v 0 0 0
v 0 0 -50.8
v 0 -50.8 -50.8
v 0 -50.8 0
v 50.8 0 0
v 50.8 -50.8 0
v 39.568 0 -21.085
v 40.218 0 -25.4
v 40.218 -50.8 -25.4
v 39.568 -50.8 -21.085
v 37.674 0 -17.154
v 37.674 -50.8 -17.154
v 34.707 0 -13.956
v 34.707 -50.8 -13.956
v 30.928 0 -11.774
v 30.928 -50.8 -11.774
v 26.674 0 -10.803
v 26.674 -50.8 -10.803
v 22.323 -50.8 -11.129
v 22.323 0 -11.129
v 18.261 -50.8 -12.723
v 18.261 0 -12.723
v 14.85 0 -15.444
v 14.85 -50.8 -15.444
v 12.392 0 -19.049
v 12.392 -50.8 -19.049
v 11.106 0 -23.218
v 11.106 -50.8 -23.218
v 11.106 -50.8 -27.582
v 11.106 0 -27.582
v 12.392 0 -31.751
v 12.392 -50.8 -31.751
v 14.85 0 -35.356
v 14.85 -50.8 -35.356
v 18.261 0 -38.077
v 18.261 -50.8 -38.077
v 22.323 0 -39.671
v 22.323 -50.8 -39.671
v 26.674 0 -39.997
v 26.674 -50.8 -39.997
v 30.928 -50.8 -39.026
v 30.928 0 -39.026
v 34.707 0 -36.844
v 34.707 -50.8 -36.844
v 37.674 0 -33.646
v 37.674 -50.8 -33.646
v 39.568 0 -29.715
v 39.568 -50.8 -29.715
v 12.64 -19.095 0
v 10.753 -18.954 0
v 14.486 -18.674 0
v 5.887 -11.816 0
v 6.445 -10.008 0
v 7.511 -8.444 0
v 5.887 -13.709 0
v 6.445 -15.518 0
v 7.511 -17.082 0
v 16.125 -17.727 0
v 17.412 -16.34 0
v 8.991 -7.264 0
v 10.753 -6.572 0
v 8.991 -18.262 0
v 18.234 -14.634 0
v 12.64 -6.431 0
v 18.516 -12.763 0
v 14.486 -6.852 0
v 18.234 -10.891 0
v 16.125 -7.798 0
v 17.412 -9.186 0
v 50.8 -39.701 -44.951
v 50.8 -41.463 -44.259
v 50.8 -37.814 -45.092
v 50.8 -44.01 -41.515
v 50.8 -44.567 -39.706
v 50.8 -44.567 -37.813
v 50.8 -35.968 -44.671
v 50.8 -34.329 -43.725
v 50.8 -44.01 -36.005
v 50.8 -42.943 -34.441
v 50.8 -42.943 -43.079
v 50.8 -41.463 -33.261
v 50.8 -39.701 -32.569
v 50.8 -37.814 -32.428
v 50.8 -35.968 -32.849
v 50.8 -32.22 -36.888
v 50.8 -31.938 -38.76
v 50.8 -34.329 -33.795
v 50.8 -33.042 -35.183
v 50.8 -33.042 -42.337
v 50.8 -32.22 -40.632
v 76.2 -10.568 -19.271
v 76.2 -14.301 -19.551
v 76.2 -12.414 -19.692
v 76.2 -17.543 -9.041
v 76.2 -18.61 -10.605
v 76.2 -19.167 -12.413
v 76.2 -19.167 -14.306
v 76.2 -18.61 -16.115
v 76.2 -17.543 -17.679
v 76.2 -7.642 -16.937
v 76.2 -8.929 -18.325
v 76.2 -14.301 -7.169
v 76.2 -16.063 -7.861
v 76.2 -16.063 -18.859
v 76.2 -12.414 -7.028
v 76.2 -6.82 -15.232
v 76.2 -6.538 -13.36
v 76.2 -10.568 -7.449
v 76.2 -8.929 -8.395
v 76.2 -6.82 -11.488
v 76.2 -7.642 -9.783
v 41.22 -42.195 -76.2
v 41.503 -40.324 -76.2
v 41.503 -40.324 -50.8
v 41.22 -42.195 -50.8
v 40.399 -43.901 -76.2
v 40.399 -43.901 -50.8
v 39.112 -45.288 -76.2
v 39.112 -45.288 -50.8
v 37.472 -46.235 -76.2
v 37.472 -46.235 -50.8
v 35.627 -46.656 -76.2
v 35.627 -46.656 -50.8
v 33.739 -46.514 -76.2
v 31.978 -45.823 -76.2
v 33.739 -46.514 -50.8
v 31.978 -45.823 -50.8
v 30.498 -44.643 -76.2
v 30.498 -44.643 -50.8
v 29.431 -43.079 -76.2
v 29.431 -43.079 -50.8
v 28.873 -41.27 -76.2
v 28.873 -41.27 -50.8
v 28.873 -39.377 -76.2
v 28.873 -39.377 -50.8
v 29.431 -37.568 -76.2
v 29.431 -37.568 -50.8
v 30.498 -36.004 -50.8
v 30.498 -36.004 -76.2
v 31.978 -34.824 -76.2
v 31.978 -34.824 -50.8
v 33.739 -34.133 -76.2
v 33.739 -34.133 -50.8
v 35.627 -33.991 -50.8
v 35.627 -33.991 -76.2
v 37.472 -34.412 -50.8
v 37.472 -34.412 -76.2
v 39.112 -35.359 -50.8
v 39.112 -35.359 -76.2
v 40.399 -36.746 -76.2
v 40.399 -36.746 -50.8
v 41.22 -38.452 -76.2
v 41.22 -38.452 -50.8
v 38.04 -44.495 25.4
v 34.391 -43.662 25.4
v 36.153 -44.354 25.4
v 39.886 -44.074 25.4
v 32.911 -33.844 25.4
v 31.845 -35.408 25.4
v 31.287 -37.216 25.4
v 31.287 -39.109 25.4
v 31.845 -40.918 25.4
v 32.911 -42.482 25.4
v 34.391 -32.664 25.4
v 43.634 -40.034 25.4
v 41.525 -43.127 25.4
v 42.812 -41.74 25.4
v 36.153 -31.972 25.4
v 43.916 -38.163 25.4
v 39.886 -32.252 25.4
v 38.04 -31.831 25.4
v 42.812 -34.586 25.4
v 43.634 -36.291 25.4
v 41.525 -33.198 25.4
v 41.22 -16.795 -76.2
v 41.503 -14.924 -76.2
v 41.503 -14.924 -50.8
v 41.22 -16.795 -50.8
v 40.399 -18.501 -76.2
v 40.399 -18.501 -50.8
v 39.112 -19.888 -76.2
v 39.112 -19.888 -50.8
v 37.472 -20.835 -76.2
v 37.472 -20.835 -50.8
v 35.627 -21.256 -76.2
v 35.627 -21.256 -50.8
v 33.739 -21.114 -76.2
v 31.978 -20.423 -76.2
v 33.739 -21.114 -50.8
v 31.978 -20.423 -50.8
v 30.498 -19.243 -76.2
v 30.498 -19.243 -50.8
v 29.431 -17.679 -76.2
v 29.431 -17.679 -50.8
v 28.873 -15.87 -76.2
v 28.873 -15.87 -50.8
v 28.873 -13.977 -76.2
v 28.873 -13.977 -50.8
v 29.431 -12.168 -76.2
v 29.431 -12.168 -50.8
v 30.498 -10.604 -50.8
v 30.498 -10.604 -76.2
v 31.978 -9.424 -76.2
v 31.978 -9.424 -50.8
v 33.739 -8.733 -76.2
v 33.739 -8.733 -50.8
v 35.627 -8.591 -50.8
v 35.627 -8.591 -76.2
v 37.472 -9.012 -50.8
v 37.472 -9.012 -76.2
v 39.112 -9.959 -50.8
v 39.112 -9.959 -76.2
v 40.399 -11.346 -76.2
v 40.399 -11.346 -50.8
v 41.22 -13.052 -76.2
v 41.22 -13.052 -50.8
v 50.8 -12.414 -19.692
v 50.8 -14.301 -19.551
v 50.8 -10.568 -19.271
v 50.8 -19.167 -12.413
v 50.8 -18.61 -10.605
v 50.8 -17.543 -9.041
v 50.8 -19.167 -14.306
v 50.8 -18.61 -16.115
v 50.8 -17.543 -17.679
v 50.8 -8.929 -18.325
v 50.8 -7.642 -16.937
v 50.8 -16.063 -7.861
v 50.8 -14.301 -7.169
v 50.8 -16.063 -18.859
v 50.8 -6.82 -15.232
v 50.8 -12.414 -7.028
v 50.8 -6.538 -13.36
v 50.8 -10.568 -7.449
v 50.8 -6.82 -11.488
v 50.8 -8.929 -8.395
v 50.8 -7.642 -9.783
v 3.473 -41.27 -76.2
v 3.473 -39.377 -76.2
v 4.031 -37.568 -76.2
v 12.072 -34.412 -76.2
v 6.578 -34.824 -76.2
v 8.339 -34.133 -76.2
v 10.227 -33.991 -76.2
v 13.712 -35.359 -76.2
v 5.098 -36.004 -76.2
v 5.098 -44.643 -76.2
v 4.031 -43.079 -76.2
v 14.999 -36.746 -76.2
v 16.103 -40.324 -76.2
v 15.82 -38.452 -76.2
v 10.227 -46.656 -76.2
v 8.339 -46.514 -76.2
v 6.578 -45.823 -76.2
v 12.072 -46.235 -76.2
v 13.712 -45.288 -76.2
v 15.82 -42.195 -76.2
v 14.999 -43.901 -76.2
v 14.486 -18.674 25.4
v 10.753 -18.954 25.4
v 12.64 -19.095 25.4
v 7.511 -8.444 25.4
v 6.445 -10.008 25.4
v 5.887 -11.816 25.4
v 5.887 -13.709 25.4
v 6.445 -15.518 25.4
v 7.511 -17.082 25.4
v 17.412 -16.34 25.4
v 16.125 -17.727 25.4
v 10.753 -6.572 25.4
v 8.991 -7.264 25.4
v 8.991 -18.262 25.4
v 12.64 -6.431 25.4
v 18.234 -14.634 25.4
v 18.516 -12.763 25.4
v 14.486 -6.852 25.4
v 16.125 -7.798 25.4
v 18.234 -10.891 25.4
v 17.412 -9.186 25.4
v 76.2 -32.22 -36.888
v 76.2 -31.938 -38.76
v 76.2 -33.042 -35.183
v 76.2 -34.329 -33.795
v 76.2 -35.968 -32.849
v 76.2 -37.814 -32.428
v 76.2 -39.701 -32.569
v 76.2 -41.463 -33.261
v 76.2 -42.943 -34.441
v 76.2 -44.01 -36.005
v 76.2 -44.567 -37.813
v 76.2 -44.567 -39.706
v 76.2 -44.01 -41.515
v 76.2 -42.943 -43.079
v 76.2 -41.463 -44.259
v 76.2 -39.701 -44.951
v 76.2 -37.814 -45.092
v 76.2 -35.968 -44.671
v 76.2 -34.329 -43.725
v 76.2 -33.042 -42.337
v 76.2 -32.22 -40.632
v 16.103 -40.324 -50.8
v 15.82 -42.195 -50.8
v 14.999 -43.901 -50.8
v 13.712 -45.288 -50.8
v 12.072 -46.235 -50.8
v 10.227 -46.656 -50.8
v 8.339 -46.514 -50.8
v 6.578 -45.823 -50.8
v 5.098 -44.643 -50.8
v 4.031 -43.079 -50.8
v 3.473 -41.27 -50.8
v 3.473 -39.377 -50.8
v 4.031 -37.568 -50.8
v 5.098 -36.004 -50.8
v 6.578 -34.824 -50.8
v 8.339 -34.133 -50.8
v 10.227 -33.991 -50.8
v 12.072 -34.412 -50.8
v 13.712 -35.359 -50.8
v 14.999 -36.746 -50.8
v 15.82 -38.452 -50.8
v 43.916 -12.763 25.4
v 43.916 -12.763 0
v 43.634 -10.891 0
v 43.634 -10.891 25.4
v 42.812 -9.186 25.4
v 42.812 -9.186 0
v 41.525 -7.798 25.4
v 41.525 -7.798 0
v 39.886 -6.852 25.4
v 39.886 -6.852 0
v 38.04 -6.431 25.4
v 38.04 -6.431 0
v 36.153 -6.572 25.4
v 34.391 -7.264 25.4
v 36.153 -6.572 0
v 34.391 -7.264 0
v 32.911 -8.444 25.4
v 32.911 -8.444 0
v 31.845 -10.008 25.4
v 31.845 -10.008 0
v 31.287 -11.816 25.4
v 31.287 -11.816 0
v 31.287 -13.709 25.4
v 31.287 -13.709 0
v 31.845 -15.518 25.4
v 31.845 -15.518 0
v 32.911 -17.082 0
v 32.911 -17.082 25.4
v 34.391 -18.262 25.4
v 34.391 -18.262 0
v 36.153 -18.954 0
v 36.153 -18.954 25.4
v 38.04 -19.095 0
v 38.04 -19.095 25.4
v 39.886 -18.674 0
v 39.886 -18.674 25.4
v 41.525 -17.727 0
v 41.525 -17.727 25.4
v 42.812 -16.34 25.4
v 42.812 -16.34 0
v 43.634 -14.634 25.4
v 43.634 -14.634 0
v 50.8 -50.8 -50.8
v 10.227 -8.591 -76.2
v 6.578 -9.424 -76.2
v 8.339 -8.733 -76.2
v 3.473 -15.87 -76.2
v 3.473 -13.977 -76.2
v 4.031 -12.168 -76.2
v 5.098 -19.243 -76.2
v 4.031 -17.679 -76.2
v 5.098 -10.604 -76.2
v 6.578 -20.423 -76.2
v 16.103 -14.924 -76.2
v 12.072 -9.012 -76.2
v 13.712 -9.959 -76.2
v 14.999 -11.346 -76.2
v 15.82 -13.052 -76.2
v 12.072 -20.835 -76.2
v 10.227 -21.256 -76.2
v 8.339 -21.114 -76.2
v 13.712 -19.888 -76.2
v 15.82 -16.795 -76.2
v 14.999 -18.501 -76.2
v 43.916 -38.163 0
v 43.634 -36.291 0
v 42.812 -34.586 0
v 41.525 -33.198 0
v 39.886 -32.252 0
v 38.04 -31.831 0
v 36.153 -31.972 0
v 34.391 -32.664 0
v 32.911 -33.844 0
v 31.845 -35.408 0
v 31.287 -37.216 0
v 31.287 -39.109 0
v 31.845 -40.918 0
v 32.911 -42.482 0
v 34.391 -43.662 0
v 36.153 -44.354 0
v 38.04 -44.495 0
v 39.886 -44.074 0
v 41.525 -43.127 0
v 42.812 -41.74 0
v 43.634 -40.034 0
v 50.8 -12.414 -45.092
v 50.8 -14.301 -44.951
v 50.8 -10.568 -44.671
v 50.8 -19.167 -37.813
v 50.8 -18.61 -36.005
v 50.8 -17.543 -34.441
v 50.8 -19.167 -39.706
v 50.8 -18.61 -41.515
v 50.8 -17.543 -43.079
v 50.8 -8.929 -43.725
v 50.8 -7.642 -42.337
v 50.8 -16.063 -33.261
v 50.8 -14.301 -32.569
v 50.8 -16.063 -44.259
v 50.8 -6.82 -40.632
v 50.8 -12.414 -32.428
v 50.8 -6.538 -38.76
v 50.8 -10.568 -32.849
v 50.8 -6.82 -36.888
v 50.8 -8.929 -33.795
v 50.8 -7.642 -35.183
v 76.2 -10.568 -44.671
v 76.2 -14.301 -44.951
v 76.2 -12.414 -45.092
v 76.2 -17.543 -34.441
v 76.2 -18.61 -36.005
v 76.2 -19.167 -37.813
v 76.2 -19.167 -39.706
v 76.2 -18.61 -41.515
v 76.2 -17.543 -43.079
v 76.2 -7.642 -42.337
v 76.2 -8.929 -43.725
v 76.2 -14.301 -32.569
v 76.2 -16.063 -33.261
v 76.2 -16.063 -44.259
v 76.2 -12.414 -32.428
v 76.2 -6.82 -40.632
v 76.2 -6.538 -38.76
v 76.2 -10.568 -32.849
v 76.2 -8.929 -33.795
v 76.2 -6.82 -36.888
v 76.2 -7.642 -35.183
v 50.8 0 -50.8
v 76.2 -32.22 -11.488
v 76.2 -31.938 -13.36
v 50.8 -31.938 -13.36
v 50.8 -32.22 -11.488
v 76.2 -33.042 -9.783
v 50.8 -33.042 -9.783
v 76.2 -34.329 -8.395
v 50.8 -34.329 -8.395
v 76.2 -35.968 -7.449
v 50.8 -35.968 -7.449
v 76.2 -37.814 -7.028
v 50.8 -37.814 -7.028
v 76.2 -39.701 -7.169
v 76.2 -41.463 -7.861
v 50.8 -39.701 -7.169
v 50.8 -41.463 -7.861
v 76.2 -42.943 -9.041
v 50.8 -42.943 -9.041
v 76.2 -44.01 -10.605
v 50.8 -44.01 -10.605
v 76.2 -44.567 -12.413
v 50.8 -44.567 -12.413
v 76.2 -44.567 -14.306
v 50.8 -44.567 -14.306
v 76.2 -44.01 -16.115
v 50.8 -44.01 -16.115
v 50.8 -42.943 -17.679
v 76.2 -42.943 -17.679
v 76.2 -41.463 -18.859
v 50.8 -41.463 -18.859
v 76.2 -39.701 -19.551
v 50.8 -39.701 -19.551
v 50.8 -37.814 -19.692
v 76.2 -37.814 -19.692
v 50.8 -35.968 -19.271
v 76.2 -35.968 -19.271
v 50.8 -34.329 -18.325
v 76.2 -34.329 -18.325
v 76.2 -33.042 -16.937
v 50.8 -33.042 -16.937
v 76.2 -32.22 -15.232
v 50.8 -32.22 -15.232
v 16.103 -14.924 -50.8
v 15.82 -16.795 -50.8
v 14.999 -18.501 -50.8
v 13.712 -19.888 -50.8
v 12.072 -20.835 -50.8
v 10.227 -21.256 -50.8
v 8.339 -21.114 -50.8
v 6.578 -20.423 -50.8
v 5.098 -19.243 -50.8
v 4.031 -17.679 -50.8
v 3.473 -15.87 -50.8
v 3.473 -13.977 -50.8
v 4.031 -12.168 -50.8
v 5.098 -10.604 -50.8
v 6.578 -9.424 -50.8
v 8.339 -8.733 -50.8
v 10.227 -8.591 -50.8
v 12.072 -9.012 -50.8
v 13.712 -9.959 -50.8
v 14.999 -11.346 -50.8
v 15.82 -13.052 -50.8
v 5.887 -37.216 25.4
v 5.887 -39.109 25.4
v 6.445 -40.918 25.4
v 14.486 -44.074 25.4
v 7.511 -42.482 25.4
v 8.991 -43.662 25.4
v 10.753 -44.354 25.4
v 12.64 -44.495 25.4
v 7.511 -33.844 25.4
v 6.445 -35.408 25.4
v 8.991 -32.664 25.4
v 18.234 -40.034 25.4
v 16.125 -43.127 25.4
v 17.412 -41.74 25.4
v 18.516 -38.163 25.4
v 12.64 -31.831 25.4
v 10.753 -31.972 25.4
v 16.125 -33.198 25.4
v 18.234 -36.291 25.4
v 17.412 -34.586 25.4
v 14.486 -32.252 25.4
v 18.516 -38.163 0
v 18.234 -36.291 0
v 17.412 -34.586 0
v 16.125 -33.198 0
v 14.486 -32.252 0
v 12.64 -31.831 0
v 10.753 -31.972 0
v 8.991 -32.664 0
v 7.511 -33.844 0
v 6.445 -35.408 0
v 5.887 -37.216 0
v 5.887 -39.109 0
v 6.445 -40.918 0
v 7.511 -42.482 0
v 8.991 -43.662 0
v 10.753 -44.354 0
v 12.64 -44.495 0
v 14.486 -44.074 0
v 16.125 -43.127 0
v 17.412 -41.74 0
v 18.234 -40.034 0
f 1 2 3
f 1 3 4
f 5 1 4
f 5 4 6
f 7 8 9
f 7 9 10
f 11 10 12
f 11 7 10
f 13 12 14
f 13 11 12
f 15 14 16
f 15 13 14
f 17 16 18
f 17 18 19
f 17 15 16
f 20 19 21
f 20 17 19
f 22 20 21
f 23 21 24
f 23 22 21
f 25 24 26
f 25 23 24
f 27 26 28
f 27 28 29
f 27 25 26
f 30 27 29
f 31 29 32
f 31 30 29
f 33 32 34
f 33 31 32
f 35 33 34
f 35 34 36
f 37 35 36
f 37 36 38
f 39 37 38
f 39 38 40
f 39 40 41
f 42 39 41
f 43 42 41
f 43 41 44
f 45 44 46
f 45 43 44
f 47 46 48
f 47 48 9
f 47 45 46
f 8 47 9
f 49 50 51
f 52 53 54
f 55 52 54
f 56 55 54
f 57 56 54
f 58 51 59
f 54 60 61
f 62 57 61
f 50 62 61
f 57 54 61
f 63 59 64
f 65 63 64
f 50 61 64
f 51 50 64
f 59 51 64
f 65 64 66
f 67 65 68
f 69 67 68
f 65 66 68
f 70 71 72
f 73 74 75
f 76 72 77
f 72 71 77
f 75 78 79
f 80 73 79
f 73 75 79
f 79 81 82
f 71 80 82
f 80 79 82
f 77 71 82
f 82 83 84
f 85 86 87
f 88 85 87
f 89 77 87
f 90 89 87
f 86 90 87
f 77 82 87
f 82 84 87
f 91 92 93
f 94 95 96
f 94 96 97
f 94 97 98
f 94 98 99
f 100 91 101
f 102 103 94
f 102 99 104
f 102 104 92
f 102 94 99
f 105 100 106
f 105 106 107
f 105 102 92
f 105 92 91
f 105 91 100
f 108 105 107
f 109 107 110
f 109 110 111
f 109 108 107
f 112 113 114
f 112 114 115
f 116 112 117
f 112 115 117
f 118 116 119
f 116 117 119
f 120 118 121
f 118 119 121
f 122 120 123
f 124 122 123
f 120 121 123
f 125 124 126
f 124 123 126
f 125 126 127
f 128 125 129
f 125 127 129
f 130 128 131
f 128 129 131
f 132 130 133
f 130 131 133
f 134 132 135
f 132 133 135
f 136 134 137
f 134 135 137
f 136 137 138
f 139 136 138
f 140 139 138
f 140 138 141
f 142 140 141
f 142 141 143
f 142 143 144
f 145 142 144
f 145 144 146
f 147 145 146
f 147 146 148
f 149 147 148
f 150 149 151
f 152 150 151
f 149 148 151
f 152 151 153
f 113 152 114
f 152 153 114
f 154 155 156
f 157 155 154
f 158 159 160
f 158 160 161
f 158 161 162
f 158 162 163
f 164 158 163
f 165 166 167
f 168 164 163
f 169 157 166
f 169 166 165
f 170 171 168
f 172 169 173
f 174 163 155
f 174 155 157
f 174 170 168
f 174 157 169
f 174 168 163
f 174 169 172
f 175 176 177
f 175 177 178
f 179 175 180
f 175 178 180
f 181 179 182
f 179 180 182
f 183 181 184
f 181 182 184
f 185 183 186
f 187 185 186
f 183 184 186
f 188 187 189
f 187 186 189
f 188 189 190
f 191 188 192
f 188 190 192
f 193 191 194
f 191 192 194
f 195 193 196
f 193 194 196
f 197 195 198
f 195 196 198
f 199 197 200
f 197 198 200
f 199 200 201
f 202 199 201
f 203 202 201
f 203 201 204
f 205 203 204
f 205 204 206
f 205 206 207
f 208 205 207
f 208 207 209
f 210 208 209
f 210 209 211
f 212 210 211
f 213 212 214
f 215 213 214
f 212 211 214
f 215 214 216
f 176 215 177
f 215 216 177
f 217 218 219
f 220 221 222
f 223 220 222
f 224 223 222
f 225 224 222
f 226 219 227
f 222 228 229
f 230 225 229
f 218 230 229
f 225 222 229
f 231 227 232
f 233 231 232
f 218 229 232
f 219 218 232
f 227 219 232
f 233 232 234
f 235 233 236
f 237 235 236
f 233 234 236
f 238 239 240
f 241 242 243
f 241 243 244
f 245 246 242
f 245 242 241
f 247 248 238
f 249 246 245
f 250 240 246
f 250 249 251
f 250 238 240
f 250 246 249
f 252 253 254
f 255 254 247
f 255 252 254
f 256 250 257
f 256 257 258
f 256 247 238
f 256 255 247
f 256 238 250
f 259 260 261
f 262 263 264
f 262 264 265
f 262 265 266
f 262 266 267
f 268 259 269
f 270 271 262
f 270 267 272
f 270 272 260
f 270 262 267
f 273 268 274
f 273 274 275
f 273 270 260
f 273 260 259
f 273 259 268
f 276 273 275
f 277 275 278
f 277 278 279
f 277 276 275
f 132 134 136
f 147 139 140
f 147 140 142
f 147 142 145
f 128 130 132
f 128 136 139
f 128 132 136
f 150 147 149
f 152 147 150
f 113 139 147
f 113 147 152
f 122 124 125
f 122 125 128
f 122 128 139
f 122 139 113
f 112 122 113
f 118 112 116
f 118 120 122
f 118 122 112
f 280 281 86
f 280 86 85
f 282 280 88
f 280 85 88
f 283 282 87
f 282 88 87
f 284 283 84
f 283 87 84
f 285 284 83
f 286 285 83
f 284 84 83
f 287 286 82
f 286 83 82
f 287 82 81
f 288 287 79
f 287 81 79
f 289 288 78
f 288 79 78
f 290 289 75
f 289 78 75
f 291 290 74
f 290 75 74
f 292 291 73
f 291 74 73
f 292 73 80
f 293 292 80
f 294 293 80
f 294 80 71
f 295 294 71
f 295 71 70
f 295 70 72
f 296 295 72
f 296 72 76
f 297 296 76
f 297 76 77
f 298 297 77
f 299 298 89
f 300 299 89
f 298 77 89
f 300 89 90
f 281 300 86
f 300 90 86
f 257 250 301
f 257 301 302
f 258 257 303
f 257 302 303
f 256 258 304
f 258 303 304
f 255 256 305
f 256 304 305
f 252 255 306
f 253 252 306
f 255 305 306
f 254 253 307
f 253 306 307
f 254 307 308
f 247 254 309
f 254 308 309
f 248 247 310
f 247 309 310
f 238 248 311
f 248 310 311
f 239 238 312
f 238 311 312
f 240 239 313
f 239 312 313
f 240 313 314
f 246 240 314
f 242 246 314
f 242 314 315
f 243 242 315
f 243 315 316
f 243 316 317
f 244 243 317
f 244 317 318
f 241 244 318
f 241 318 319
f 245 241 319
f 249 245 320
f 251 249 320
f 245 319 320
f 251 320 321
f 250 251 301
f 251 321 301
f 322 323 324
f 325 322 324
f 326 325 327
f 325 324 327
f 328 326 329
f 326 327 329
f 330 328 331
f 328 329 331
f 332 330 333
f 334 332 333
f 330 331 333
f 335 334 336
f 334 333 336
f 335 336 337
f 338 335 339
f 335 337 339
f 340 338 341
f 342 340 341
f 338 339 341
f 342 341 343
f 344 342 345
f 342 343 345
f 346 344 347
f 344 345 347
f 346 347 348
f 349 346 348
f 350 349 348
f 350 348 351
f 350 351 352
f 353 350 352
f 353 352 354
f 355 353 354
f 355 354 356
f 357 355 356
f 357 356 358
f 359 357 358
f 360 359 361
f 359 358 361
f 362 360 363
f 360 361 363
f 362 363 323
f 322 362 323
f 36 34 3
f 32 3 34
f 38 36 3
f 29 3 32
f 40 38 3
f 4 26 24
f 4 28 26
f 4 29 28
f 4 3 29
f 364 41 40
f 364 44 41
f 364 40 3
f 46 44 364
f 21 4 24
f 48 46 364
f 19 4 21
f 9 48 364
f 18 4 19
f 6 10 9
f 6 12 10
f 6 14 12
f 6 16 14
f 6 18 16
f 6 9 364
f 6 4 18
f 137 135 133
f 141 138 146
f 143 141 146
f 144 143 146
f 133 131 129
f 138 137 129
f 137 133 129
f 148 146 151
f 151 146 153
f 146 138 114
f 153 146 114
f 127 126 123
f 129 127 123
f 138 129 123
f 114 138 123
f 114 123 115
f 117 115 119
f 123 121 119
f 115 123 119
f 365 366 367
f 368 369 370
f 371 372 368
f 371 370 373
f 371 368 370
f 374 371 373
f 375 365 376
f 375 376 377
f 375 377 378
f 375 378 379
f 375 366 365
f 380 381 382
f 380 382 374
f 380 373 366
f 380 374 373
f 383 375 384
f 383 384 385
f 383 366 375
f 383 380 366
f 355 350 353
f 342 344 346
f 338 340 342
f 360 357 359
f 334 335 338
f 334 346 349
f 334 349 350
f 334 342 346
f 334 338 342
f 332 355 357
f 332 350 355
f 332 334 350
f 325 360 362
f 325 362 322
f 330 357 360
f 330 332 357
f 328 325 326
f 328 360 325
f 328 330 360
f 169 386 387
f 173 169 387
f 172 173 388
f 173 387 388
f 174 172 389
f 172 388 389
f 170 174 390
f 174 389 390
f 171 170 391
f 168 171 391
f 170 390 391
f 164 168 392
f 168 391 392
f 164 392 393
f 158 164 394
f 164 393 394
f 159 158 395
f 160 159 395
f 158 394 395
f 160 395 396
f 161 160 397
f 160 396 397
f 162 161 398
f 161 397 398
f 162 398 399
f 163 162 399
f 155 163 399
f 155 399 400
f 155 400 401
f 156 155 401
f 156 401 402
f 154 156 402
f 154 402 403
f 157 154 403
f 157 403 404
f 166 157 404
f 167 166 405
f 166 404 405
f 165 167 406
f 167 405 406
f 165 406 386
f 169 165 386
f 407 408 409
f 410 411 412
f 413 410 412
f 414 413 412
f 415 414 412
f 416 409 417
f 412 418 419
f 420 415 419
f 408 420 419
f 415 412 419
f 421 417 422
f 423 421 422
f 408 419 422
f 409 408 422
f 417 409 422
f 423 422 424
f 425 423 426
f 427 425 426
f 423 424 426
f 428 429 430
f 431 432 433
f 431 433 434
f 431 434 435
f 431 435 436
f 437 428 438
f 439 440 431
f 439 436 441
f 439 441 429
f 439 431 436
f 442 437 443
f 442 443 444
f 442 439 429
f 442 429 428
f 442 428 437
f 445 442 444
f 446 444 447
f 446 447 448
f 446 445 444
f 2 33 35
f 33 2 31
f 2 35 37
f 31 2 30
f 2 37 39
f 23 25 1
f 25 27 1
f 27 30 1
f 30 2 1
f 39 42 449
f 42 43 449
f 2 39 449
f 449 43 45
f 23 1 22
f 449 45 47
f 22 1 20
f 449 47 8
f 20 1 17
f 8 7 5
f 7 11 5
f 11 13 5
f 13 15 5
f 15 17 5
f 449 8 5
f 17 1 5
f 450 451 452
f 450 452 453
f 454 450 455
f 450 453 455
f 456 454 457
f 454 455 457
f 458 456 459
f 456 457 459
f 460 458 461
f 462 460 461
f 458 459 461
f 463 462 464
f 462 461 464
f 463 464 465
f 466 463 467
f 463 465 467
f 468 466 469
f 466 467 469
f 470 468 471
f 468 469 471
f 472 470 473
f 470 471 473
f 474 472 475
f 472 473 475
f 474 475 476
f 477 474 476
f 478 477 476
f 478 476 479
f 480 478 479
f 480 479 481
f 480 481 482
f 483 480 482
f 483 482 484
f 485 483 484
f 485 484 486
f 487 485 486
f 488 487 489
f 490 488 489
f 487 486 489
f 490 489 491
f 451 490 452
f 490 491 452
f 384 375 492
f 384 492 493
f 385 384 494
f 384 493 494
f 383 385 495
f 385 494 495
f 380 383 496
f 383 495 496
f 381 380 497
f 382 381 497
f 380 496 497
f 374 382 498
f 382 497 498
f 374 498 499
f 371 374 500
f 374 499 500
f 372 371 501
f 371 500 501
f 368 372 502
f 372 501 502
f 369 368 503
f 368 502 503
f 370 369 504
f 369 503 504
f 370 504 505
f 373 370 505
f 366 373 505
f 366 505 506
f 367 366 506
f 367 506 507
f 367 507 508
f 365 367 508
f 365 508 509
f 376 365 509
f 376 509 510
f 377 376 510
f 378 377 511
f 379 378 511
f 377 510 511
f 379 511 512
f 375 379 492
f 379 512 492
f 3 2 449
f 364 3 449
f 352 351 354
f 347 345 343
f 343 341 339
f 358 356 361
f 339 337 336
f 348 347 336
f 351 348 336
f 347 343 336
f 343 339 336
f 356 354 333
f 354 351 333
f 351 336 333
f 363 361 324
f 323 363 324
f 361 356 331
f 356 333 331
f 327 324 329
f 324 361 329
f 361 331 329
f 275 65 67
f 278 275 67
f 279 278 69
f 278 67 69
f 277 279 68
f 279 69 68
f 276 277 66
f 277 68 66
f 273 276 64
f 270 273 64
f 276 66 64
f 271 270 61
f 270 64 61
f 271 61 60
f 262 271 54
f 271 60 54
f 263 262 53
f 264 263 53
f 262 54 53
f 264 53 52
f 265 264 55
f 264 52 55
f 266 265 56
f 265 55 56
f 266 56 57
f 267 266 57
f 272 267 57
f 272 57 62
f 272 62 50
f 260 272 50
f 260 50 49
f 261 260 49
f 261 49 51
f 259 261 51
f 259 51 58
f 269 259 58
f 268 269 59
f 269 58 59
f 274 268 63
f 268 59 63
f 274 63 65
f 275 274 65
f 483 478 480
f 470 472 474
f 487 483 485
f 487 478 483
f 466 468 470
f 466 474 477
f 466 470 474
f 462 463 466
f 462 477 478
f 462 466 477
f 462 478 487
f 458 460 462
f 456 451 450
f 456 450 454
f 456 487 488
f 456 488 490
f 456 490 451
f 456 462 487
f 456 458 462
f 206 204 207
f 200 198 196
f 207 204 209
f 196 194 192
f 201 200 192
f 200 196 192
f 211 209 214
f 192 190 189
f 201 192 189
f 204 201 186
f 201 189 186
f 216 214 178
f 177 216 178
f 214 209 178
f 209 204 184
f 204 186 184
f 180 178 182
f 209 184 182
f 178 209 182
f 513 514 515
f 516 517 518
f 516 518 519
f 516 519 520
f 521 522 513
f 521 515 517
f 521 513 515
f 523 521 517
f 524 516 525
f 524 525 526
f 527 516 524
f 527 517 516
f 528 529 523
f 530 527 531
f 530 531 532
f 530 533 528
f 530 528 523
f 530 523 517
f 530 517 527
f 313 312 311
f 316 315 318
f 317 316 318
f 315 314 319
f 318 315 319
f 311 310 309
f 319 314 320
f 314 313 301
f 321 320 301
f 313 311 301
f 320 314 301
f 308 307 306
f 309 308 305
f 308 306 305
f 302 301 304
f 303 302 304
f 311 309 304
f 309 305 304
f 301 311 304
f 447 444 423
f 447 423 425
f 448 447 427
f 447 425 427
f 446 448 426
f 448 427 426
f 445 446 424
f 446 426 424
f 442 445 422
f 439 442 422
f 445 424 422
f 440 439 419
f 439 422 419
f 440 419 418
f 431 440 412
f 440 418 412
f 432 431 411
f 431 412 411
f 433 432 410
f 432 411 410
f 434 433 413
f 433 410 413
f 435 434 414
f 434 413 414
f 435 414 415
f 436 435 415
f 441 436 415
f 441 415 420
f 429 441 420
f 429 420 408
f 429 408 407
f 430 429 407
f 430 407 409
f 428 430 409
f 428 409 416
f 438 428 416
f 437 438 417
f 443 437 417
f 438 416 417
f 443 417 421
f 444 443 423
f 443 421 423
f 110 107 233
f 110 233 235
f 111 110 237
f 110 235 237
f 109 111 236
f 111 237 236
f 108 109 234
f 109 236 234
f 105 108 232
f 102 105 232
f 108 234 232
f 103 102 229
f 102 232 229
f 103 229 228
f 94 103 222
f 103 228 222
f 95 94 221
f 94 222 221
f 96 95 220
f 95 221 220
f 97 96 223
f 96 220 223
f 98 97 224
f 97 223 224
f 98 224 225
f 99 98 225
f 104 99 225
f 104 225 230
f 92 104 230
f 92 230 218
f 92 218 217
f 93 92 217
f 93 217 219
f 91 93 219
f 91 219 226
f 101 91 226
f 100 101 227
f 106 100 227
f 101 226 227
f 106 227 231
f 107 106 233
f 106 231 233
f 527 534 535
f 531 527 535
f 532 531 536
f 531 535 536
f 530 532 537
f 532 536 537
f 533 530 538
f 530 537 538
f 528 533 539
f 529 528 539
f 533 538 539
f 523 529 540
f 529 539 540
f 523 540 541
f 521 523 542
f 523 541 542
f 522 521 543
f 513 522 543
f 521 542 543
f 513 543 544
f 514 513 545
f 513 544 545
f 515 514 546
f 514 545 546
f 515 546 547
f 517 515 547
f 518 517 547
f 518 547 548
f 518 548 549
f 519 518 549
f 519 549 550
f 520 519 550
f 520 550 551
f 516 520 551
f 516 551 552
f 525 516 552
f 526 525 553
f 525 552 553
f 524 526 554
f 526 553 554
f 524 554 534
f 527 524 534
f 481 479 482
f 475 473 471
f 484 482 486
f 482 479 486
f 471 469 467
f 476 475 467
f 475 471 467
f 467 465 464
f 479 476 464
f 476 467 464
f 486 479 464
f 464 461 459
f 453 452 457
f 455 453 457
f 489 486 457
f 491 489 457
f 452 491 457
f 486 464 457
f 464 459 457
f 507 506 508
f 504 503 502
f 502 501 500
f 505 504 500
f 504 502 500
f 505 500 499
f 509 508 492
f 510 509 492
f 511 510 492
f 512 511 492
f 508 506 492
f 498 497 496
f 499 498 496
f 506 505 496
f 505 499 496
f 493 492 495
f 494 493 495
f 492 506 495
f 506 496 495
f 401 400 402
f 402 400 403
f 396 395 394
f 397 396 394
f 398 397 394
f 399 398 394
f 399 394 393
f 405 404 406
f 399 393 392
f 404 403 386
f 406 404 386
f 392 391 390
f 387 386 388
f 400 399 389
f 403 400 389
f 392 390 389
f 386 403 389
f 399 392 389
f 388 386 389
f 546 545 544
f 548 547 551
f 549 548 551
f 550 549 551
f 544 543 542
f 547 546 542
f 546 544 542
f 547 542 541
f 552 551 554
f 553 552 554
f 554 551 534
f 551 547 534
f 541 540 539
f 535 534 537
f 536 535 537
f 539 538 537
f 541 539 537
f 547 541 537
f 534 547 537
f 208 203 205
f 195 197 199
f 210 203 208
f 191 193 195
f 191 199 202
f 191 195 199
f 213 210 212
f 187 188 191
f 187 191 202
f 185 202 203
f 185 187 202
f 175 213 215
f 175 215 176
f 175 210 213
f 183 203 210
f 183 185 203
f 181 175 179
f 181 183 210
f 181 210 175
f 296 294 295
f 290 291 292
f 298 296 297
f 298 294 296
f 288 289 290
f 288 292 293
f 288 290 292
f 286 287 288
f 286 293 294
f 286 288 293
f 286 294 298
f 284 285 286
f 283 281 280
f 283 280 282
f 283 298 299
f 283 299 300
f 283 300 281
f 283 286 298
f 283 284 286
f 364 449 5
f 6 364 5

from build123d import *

# Parameters (mm, degrees)
F0_W     = 50.8
F0_H     = 50.8
F0_R     = 14.6377609255
F1_DEPTH = 50.8
F2_R     = 6.35
F3_DEPTH = 25.4
F4_R     = 6.35
F5_DEPTH = 25.4
F6_R     = 6.35
F7_DEPTH = 25.4


# Not quite as in the source:
# - the program builds the solid bodies; features that only make, move or delete a surface that nothing else refers to are left out


with BuildPart() as f1:
    # F0 (on Front) → F1 (new body)
    with BuildSketch(Plane.XZ):
        with Locations((25.4, -25.4)):
            Rectangle(F0_W, F0_H)
        with Locations((25.5802143365, -25.4)):
            Circle(F0_R, mode=Mode.SUBTRACT)
    extrude(amount=F1_DEPTH)


with BuildPart() as f3:
    # F2 (on Top) → F3 (new body)
    with BuildSketch(Plane.XY):
        with Locations((37.5657010168, -12.7627896145)):
            Circle(F2_R)
    extrude(amount=F3_DEPTH)


with BuildPart() as f3b:
    # F2 (on Top) → F3, piece 2 (new body)
    with BuildSketch(Plane.XY):
        with Locations((37.5657010168, -38.1627896145)):
            Circle(F2_R)
    extrude(amount=F3_DEPTH)


with BuildPart() as f3c:
    # F2 (on Top) → F3, piece 3 (new body)
    with BuildSketch(Plane.XY):
        with Locations((12.1657010168, -38.1627896145)):
            Circle(F2_R)
    extrude(amount=F3_DEPTH)


with BuildPart() as f3d:
    # F2 (on Top) → F3, piece 4 (new body)
    with BuildSketch(Plane.XY):
        with Locations((12.1657010168, -12.7627896145)):
            Circle(F2_R)
    extrude(amount=F3_DEPTH)


with BuildPart() as f5:
    # F4 (on face) → F5 (new body)
    with BuildSketch(Plane.YZ.offset(50.8)):
        with Locations((-12.8883697748, -38.7598782122)):
            Circle(F4_R)
    extrude(amount=F5_DEPTH)


with BuildPart() as f5b:
    # F4 (on face) → F5, piece 2 (new body)
    with BuildSketch(Plane.YZ.offset(50.8)):
        with Locations((-12.8883697748, -13.3598782122)):
            Circle(F4_R)
    extrude(amount=F5_DEPTH)


with BuildPart() as f5c:
    # F4 (on face) → F5, piece 3 (new body)
    with BuildSketch(Plane.YZ.offset(50.8)):
        with Locations((-38.2883697748, -13.3598782122)):
            Circle(F4_R)
    extrude(amount=F5_DEPTH)


with BuildPart() as f5d:
    # F4 (on face) → F5, piece 4 (new body)
    with BuildSketch(Plane.YZ.offset(50.8)):
        with Locations((-38.2883697748, -38.7598782122)):
            Circle(F4_R)
    extrude(amount=F5_DEPTH)


with BuildPart() as f7:
    # F6 (on face) → F7 (new body)
    with BuildSketch(Plane(origin=(0, 0, -50.8), x_dir=(1, 0, 0), z_dir=(0, 0, -1))):
        with Locations((9.7525073215, 40.323510766)):
            Circle(F6_R)
    extrude(amount=F7_DEPTH)


with BuildPart() as f7b:
    # F6 (on face) → F7, piece 2 (new body)
    with BuildSketch(Plane(origin=(0, 0, -50.8), x_dir=(1, 0, 0), z_dir=(0, 0, -1))):
        with Locations((35.1525073215, 14.923510766)):
            Circle(F6_R)
    extrude(amount=F7_DEPTH)


with BuildPart() as f7c:
    # F6 (on face) → F7, piece 3 (new body)
    with BuildSketch(Plane(origin=(0, 0, -50.8), x_dir=(1, 0, 0), z_dir=(0, 0, -1))):
        with Locations((9.7525073215, 14.923510766)):
            Circle(F6_R)
    extrude(amount=F7_DEPTH)


with BuildPart() as f7d:
    # F6 (on face) → F7, piece 4 (new body)
    with BuildSketch(Plane(origin=(0, 0, -50.8), x_dir=(1, 0, 0), z_dir=(0, 0, -1))):
        with Locations((35.1525073215, 40.323510766)):
            Circle(F6_R)
    extrude(amount=F7_DEPTH)


solid = Compound([f1.part, f3.part, f3b.part, f3c.part, f3d.part, f5.part, f5b.part, f5c.part, f5d.part, f7.part, f7b.part, f7c.part, f7d.part])
